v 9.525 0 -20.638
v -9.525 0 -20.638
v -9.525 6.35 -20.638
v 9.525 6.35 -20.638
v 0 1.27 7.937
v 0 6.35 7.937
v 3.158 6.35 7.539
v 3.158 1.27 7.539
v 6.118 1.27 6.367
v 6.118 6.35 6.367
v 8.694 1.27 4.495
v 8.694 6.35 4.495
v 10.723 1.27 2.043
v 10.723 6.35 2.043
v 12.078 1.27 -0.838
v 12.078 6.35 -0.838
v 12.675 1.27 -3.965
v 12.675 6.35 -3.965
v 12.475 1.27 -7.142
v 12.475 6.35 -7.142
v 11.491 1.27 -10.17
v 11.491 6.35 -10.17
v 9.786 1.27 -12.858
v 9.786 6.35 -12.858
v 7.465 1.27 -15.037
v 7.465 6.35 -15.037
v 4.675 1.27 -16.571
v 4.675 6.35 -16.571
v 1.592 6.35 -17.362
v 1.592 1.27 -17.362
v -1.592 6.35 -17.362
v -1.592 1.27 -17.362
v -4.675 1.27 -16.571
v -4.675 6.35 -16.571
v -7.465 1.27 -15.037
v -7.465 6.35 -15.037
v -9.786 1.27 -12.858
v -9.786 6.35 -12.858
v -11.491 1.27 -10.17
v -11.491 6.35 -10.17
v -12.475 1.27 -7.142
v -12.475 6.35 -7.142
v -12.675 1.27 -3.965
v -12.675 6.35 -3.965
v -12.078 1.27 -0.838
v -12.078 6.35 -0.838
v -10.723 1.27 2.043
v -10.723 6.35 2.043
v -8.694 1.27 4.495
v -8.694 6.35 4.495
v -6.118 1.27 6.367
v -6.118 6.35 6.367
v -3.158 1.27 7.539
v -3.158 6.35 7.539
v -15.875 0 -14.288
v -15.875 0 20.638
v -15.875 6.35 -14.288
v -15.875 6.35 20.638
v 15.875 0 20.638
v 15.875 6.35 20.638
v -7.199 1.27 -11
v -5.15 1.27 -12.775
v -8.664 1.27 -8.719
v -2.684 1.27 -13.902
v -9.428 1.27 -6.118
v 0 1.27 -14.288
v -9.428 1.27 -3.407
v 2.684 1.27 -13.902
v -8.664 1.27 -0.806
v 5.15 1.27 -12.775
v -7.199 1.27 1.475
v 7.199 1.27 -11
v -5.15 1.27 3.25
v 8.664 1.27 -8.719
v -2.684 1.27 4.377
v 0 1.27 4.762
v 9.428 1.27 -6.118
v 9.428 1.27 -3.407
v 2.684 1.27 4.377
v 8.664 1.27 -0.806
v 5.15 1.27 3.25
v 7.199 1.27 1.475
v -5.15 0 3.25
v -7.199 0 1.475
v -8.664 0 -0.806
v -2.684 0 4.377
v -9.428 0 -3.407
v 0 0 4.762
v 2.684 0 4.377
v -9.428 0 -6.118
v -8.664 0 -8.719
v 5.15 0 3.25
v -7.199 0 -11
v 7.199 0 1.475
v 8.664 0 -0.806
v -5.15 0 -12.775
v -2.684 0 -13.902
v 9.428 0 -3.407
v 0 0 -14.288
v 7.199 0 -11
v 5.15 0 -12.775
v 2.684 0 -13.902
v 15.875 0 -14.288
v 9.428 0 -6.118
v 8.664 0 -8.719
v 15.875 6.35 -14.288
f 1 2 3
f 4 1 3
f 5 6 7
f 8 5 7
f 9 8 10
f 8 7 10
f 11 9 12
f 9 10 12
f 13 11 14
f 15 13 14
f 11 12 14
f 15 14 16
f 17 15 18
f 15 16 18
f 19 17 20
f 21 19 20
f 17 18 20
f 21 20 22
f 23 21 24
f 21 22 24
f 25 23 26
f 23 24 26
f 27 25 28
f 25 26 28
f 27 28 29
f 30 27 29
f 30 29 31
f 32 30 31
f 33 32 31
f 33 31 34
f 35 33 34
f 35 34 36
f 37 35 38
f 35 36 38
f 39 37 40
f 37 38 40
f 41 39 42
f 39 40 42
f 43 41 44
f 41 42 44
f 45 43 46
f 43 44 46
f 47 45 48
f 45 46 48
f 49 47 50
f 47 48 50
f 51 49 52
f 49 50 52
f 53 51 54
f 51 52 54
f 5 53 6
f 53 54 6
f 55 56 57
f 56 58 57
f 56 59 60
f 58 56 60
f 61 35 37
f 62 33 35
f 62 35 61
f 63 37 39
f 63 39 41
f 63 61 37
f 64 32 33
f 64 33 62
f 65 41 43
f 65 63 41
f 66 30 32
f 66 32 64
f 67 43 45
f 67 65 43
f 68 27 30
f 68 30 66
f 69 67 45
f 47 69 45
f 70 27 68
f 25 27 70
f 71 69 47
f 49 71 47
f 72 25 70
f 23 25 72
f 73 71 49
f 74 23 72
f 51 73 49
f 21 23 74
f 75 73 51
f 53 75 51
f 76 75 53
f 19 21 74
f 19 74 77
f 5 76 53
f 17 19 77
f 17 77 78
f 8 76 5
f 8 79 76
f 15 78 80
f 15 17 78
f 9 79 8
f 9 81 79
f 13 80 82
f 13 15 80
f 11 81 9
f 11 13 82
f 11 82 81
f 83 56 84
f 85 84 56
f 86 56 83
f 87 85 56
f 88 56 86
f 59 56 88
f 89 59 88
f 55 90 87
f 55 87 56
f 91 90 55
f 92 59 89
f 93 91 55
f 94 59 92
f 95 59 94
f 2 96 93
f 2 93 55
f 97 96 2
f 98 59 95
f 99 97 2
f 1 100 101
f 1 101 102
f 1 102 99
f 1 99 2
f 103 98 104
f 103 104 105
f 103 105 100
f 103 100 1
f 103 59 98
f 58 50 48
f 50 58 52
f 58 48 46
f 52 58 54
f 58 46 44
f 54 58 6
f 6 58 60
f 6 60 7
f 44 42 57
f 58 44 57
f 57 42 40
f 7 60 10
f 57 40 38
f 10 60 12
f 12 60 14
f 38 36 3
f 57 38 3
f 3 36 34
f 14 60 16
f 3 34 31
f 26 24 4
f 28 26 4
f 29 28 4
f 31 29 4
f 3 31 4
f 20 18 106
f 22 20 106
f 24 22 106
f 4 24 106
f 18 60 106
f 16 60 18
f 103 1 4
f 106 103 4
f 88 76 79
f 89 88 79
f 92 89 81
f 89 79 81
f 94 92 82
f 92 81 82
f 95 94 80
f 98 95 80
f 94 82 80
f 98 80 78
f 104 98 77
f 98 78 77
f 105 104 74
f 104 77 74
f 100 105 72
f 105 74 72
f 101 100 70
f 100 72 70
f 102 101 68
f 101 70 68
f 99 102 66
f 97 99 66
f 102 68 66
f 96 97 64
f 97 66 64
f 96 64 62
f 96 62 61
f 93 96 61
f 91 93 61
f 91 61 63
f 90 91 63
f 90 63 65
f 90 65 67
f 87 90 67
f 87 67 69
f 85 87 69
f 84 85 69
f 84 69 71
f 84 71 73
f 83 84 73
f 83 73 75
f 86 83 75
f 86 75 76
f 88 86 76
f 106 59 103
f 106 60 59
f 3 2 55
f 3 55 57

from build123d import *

# Parameters (mm, degrees)
SKETCH1_W           = 41.275
SKETCH1_H           = 6.35
BOSS_EXTRUDE1_DEPTH = 15.875
SKETCH4_R           = 12.7
CUT_EXTRUDE4_DEPTH  = 5.08
SKETCH5_R           = 9.525
CUT_EXTRUDE5_DEPTH  = 6.35
CHAMFER1_SIZE       = 6.35


with BuildPart() as part:
    # Sketch1 → Boss-Extrude1 (new, symmetric)
    with BuildSketch(Plane(origin=(0, 0, 0), x_dir=(0, 0, -1), z_dir=(1, 0, 0))):
        with Locations((0, 3.175)):
            Rectangle(SKETCH1_W, SKETCH1_H)
    extrude(amount=BOSS_EXTRUDE1_DEPTH, both=True)

    # Sketch4 → Cut-Extrude4 (cut)
    with BuildSketch(Plane(origin=(0, 6.35, 0), x_dir=(1, 0, 0), z_dir=(0, 1, 0))):
        with Locations(Location((0, 4.7625, 0), (0, 0, 270))):
            Circle(SKETCH4_R)
    extrude(amount=-CUT_EXTRUDE4_DEPTH, mode=Mode.SUBTRACT)

    # Sketch5 → Cut-Extrude5 (cut)
    with BuildSketch(Plane(origin=(0, 1.27, 0), x_dir=(1, 0, 0), z_dir=(0, 1, 0))):
        with Locations(Location((0, 4.7625, 0), (0, 0, 270))):
            Circle(SKETCH5_R)
    extrude(amount=-CUT_EXTRUDE5_DEPTH, mode=Mode.SUBTRACT)

    # Chamfer1
    chamfer1_edges = [part.edges().sort_by_distance(p)[0] for p in [
        (15.875, 3.175, -20.6375),
        (-15.875, 3.175, -20.6375),
    ]]
    chamfer(chamfer1_edges, length=CHAMFER1_SIZE)


solid = part.part
